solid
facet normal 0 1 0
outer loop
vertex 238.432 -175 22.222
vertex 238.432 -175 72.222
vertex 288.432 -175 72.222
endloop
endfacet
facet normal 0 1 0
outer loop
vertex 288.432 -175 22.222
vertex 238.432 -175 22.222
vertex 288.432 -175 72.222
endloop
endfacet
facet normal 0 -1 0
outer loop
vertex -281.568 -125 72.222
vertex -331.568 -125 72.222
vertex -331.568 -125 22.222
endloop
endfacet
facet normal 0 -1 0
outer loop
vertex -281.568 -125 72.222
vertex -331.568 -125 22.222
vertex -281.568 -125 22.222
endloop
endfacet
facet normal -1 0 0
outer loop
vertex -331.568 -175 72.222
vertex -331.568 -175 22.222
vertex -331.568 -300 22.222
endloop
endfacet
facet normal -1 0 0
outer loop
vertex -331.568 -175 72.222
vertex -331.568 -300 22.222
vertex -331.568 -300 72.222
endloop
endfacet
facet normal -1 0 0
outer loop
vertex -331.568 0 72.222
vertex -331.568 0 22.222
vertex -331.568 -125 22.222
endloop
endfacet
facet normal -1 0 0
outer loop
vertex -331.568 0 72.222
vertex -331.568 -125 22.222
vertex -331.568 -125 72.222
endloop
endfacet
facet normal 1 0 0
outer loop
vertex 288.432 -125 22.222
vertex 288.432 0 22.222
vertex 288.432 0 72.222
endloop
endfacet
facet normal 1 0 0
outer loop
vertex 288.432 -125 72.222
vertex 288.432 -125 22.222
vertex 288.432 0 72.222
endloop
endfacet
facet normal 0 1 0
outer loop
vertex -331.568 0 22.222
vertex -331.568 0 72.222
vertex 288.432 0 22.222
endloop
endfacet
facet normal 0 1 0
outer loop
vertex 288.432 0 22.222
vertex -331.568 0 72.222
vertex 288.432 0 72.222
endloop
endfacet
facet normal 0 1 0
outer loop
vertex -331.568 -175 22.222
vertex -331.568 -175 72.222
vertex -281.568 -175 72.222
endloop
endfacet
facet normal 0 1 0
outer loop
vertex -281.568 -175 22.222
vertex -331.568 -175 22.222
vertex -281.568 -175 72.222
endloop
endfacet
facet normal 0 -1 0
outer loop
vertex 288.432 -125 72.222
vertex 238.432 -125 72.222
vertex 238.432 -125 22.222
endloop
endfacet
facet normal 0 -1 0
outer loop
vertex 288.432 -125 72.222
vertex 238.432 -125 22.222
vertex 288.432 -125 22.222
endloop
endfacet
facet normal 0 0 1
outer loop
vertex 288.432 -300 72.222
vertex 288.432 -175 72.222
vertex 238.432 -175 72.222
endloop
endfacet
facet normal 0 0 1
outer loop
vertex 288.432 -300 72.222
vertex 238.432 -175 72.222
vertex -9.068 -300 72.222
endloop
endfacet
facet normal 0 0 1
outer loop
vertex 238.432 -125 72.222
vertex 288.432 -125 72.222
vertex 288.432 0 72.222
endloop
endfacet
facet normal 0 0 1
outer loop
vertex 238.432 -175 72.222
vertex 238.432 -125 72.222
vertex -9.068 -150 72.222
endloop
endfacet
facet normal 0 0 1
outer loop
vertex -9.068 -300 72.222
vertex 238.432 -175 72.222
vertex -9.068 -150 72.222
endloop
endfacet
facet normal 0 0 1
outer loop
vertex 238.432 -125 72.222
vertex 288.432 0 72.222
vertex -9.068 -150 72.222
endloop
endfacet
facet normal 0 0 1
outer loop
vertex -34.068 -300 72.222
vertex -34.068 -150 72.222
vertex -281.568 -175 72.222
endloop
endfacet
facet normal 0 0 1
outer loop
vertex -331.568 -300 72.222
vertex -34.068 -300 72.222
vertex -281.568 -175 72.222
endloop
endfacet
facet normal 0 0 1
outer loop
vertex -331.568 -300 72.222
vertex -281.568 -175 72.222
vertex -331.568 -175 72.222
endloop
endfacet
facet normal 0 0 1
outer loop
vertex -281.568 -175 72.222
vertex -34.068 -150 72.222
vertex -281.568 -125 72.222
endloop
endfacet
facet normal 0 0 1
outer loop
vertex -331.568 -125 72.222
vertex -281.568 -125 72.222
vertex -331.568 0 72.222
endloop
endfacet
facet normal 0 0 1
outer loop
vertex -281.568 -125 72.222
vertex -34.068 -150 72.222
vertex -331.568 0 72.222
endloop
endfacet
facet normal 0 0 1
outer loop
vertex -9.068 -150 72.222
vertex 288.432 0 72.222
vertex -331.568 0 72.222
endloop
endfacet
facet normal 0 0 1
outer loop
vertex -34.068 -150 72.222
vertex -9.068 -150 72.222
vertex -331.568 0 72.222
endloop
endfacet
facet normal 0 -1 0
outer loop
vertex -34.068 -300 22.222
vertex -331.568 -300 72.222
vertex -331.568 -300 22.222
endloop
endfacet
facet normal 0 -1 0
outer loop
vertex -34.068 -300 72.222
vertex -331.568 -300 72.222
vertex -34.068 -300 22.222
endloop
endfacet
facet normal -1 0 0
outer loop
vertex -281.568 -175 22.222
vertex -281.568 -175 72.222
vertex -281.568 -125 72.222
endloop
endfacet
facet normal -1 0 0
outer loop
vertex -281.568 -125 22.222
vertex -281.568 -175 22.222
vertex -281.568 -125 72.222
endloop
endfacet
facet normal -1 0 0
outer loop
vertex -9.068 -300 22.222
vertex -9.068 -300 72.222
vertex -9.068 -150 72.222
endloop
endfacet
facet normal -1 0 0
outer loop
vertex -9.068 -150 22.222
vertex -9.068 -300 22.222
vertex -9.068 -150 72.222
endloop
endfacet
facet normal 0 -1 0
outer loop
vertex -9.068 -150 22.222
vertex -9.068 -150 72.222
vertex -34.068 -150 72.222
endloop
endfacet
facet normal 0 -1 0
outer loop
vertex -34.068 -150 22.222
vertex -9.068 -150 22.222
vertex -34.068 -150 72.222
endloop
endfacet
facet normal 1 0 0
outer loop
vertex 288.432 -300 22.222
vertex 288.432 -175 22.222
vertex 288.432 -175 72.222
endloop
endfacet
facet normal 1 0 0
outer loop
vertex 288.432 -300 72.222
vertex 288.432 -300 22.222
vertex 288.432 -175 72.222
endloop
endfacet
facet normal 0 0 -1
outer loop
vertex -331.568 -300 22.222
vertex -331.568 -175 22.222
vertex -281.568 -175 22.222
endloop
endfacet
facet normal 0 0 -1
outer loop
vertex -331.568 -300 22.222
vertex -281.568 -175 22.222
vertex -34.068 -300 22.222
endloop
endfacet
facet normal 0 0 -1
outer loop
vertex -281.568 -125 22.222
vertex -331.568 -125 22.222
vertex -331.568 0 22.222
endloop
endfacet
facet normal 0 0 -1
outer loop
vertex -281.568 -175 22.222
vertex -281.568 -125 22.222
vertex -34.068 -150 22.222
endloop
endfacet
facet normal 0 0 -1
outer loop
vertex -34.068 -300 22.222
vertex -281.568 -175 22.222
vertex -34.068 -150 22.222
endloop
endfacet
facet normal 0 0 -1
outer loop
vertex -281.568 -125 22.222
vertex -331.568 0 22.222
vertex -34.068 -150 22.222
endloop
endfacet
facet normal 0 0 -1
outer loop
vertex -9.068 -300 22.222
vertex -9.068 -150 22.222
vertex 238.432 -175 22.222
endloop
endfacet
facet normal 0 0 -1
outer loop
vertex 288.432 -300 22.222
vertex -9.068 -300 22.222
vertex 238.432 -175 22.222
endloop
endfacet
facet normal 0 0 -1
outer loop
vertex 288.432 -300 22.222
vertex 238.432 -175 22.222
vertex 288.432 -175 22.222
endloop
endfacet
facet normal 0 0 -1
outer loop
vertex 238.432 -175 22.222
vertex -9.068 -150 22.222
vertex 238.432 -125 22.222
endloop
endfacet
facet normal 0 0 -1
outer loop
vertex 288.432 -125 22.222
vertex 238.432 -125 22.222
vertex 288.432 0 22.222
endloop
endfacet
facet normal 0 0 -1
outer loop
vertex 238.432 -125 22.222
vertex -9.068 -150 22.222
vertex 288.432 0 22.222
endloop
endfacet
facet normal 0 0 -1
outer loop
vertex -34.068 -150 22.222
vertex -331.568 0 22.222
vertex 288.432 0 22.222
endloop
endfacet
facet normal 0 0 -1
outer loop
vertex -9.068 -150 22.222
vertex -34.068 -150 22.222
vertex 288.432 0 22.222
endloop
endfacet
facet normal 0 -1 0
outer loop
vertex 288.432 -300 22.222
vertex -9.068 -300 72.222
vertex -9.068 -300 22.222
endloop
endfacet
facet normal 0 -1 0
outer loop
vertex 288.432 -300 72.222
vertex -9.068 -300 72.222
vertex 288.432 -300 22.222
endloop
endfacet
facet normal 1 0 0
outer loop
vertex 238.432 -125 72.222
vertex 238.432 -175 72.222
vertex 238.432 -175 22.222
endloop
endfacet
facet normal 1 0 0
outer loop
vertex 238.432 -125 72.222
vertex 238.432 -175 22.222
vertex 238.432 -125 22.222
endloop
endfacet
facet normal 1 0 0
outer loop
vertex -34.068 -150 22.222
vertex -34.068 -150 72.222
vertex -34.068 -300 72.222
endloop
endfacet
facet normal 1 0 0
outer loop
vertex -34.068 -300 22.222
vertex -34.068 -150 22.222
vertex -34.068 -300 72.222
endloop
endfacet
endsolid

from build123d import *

# Parameters (mm, degrees)
F0_W     = 300
F0_H     = 50
F0_W_2   = 20
F1_DEPTH = 300
F2_W     = 50
F2_H     = 50
F3_DEPTH = 50
F4_DEPTH = 50


with BuildPart() as f1:
    # F0 (on Front) → F1 (new body)
    with BuildSketch(Plane.XZ):
        with Locations((-181.567696, 47.222274)):
            Rectangle(F0_W, F0_H)
        with Locations((-21.567696, 47.222274)):
            Rectangle(F0_W_2, F0_H)
        with Locations((138.432304, 47.222274)):
            Rectangle(F0_W, F0_H)
    extrude(amount=F1_DEPTH)

    # F2 (on face) → F3 (cut)
    with BuildSketch(Plane.XY.offset(72.222274)):
        with Locations((-306.567696, -150)):
            Rectangle(F2_W, F2_H)
        with Locations((263.432304, -150)):
            Rectangle(F2_W, F2_H)
    extrude(amount=-F3_DEPTH, mode=Mode.SUBTRACT)

    # F2 (on face) → F4 (cut)
    with BuildSketch(Plane.XY.offset(72.222274)):
        Polygon((-21.567696, -300), (-9.067696, -300), (-9.067696, -150), (-34.067696, -150), (-34.067696, -300), align=None)
    extrude(amount=-F4_DEPTH, mode=Mode.SUBTRACT)


solid = f1.part
